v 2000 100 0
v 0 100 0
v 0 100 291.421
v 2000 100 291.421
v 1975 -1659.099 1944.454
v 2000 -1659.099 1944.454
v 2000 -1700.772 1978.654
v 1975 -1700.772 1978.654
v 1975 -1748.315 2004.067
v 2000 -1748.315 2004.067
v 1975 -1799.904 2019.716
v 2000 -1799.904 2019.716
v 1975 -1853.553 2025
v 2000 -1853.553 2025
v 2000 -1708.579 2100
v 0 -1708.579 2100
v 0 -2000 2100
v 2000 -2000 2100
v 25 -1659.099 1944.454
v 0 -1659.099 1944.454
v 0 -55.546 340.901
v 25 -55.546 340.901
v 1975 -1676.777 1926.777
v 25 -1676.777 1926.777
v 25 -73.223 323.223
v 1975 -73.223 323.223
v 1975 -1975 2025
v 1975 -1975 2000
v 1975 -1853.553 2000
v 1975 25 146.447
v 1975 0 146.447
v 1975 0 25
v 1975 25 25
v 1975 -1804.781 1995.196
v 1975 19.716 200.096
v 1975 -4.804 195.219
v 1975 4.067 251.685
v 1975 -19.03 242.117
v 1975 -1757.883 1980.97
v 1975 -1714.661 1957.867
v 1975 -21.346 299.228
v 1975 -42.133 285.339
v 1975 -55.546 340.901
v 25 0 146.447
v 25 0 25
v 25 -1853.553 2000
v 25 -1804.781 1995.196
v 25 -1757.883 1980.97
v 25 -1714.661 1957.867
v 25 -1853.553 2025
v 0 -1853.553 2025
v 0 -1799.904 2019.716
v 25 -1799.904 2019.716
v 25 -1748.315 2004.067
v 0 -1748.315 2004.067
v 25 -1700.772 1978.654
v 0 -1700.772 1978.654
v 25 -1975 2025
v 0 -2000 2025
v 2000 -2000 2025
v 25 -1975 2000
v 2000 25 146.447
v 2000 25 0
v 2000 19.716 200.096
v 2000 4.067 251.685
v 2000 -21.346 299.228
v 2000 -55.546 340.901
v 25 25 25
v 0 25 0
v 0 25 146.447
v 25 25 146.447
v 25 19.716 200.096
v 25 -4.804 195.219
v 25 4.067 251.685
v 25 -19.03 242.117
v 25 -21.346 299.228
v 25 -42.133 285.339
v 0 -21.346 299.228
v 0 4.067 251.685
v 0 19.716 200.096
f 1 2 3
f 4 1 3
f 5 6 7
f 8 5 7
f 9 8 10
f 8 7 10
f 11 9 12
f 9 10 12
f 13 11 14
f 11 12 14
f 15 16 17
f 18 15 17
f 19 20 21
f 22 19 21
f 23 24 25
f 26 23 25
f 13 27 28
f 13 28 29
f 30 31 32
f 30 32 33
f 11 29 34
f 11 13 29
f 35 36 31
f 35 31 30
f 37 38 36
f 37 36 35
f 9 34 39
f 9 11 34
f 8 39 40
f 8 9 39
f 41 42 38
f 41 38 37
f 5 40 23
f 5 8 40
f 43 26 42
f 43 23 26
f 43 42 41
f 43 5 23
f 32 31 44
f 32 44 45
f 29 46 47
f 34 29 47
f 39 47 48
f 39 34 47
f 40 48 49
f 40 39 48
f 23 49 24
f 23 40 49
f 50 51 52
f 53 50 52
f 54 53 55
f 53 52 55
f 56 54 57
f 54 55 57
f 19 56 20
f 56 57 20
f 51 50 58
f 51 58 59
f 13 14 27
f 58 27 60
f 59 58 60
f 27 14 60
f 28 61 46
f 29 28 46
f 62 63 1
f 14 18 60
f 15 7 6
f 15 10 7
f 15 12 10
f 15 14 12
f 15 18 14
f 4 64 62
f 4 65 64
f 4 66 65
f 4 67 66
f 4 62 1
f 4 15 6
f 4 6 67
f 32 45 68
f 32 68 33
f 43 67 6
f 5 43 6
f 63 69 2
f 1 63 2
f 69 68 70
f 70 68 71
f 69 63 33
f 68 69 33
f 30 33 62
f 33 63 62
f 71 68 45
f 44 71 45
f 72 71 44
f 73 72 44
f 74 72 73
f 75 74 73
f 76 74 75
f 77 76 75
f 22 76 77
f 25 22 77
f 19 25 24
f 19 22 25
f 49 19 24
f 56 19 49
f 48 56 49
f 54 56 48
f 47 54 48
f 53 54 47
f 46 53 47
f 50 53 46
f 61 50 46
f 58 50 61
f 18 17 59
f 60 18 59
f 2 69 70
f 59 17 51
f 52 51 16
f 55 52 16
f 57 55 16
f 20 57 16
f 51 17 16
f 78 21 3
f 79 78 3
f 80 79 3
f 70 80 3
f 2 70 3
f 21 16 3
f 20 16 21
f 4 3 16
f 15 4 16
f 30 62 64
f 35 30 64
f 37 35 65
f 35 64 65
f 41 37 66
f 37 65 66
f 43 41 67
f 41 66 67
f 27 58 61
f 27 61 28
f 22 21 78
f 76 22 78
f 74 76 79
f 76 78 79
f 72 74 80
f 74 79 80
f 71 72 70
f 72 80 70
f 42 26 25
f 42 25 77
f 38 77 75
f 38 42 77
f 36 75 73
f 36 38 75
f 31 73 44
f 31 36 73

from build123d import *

# Parameters (mm, degrees)
F1_DEPTH  = 2000
F2_R      = 250
F4_DEPTH  = 25
F6_DEPTH  = 25
F7_W      = 1950
F7_H      = 25
F8_DEPTH  = 25
F9_W      = 1950
F9_H      = 25
F10_DEPTH = 25


with BuildPart() as f1:
    # F0 (on Right) → F1 (new body)
    with BuildSketch(Plane.YZ):
        Polygon((-2000, 2100), (-2000, 2000), (-1750, 2000), (0, 250), (0, 0), (100, 0), (100, 291.421356), (-1708.578644, 2100), align=None)
    extrude(amount=F1_DEPTH)

    # F2
    f2_edges = [f1.edges().sort_by_distance(p)[0] for p in [
        (1000, -1750, 2000),
        (1000, 0, 250),
    ]]
    fillet(f2_edges, radius=F2_R)

    # F3 (on face) → F4 (cut)
    with BuildSketch(Plane(origin=(0, 0, 0), x_dir=(0, -1, 0), z_dir=(-1, 0, 0))):
        with BuildLine():
            ThreePointArc((55.545635, 340.900974), (-4.066871, 251.684553), (-25, 146.446609))
            Line((-25, 146.446609), (-25, 0))
            Line((-25, 0), (0, 0))
            Line((0, 0), (0, 146.446609))
            ThreePointArc((0, 146.446609), (19.030117, 242.117467), (73.223305, 323.223305))
            Line((73.223305, 323.223305), (1676.776695, 1926.776695))
            ThreePointArc((1676.776695, 1926.776695), (1757.882533, 1980.969883), (1853.553391, 2000))
            Line((1853.553391, 2000), (2000, 2000))
            Line((2000, 2000), (2000, 2025))
            Line((2000, 2025), (1853.553391, 2025))
            ThreePointArc((1853.553391, 2025), (1748.315447, 2004.066871), (1659.099026, 1944.454365))
            Line((1659.099026, 1944.454365), (55.545635, 340.900974))
        make_face()
    extrude(amount=-F4_DEPTH, mode=Mode.SUBTRACT)

    # F5 (on face) → F6 (cut)
    with BuildSketch(Plane.YZ.offset(2000)):
        with BuildLine():
            Line((25, 0), (25, 146.446609))
            ThreePointArc((25, 146.446609), (4.066871, 251.684553), (-55.545635, 340.900974))
            Line((-55.545635, 340.900974), (-1659.099026, 1944.454365))
            ThreePointArc((-1659.099026, 1944.454365), (-1748.315447, 2004.066871), (-1853.553391, 2025))
            Line((-1853.553391, 2025), (-2000, 2025))
            Line((-2000, 2025), (-2000, 2000))
            Line((-2000, 2000), (-1853.553391, 2000))
            ThreePointArc((-1853.553391, 2000), (-1757.882533, 1980.969883), (-1676.776695, 1926.776695))
            Line((-1676.776695, 1926.776695), (-73.223305, 323.223305))
            ThreePointArc((-73.223305, 323.223305), (-19.030117, 242.117467), (0, 146.446609))
            Line((0, 146.446609), (0, 0))
            Line((0, 0), (25, 0))
        make_face()
    extrude(amount=-F6_DEPTH, mode=Mode.SUBTRACT)

    # F7 (on face) → F8 (cut)
    with BuildSketch(Plane.XZ.offset(2000)):
        with Locations((1000, 2012.5)):
            Rectangle(F7_W, F7_H)
    extrude(amount=-F8_DEPTH, mode=Mode.SUBTRACT)

    # F9 (on face) → F10 (cut)
    with BuildSketch(Plane(origin=(0, 0, 0), x_dir=(1, 0, 0), z_dir=(0, 0, -1))):
        with Locations((1000, -12.5)):
            Rectangle(F9_W, F9_H)
    extrude(amount=-F10_DEPTH, mode=Mode.SUBTRACT)


solid = f1.part
